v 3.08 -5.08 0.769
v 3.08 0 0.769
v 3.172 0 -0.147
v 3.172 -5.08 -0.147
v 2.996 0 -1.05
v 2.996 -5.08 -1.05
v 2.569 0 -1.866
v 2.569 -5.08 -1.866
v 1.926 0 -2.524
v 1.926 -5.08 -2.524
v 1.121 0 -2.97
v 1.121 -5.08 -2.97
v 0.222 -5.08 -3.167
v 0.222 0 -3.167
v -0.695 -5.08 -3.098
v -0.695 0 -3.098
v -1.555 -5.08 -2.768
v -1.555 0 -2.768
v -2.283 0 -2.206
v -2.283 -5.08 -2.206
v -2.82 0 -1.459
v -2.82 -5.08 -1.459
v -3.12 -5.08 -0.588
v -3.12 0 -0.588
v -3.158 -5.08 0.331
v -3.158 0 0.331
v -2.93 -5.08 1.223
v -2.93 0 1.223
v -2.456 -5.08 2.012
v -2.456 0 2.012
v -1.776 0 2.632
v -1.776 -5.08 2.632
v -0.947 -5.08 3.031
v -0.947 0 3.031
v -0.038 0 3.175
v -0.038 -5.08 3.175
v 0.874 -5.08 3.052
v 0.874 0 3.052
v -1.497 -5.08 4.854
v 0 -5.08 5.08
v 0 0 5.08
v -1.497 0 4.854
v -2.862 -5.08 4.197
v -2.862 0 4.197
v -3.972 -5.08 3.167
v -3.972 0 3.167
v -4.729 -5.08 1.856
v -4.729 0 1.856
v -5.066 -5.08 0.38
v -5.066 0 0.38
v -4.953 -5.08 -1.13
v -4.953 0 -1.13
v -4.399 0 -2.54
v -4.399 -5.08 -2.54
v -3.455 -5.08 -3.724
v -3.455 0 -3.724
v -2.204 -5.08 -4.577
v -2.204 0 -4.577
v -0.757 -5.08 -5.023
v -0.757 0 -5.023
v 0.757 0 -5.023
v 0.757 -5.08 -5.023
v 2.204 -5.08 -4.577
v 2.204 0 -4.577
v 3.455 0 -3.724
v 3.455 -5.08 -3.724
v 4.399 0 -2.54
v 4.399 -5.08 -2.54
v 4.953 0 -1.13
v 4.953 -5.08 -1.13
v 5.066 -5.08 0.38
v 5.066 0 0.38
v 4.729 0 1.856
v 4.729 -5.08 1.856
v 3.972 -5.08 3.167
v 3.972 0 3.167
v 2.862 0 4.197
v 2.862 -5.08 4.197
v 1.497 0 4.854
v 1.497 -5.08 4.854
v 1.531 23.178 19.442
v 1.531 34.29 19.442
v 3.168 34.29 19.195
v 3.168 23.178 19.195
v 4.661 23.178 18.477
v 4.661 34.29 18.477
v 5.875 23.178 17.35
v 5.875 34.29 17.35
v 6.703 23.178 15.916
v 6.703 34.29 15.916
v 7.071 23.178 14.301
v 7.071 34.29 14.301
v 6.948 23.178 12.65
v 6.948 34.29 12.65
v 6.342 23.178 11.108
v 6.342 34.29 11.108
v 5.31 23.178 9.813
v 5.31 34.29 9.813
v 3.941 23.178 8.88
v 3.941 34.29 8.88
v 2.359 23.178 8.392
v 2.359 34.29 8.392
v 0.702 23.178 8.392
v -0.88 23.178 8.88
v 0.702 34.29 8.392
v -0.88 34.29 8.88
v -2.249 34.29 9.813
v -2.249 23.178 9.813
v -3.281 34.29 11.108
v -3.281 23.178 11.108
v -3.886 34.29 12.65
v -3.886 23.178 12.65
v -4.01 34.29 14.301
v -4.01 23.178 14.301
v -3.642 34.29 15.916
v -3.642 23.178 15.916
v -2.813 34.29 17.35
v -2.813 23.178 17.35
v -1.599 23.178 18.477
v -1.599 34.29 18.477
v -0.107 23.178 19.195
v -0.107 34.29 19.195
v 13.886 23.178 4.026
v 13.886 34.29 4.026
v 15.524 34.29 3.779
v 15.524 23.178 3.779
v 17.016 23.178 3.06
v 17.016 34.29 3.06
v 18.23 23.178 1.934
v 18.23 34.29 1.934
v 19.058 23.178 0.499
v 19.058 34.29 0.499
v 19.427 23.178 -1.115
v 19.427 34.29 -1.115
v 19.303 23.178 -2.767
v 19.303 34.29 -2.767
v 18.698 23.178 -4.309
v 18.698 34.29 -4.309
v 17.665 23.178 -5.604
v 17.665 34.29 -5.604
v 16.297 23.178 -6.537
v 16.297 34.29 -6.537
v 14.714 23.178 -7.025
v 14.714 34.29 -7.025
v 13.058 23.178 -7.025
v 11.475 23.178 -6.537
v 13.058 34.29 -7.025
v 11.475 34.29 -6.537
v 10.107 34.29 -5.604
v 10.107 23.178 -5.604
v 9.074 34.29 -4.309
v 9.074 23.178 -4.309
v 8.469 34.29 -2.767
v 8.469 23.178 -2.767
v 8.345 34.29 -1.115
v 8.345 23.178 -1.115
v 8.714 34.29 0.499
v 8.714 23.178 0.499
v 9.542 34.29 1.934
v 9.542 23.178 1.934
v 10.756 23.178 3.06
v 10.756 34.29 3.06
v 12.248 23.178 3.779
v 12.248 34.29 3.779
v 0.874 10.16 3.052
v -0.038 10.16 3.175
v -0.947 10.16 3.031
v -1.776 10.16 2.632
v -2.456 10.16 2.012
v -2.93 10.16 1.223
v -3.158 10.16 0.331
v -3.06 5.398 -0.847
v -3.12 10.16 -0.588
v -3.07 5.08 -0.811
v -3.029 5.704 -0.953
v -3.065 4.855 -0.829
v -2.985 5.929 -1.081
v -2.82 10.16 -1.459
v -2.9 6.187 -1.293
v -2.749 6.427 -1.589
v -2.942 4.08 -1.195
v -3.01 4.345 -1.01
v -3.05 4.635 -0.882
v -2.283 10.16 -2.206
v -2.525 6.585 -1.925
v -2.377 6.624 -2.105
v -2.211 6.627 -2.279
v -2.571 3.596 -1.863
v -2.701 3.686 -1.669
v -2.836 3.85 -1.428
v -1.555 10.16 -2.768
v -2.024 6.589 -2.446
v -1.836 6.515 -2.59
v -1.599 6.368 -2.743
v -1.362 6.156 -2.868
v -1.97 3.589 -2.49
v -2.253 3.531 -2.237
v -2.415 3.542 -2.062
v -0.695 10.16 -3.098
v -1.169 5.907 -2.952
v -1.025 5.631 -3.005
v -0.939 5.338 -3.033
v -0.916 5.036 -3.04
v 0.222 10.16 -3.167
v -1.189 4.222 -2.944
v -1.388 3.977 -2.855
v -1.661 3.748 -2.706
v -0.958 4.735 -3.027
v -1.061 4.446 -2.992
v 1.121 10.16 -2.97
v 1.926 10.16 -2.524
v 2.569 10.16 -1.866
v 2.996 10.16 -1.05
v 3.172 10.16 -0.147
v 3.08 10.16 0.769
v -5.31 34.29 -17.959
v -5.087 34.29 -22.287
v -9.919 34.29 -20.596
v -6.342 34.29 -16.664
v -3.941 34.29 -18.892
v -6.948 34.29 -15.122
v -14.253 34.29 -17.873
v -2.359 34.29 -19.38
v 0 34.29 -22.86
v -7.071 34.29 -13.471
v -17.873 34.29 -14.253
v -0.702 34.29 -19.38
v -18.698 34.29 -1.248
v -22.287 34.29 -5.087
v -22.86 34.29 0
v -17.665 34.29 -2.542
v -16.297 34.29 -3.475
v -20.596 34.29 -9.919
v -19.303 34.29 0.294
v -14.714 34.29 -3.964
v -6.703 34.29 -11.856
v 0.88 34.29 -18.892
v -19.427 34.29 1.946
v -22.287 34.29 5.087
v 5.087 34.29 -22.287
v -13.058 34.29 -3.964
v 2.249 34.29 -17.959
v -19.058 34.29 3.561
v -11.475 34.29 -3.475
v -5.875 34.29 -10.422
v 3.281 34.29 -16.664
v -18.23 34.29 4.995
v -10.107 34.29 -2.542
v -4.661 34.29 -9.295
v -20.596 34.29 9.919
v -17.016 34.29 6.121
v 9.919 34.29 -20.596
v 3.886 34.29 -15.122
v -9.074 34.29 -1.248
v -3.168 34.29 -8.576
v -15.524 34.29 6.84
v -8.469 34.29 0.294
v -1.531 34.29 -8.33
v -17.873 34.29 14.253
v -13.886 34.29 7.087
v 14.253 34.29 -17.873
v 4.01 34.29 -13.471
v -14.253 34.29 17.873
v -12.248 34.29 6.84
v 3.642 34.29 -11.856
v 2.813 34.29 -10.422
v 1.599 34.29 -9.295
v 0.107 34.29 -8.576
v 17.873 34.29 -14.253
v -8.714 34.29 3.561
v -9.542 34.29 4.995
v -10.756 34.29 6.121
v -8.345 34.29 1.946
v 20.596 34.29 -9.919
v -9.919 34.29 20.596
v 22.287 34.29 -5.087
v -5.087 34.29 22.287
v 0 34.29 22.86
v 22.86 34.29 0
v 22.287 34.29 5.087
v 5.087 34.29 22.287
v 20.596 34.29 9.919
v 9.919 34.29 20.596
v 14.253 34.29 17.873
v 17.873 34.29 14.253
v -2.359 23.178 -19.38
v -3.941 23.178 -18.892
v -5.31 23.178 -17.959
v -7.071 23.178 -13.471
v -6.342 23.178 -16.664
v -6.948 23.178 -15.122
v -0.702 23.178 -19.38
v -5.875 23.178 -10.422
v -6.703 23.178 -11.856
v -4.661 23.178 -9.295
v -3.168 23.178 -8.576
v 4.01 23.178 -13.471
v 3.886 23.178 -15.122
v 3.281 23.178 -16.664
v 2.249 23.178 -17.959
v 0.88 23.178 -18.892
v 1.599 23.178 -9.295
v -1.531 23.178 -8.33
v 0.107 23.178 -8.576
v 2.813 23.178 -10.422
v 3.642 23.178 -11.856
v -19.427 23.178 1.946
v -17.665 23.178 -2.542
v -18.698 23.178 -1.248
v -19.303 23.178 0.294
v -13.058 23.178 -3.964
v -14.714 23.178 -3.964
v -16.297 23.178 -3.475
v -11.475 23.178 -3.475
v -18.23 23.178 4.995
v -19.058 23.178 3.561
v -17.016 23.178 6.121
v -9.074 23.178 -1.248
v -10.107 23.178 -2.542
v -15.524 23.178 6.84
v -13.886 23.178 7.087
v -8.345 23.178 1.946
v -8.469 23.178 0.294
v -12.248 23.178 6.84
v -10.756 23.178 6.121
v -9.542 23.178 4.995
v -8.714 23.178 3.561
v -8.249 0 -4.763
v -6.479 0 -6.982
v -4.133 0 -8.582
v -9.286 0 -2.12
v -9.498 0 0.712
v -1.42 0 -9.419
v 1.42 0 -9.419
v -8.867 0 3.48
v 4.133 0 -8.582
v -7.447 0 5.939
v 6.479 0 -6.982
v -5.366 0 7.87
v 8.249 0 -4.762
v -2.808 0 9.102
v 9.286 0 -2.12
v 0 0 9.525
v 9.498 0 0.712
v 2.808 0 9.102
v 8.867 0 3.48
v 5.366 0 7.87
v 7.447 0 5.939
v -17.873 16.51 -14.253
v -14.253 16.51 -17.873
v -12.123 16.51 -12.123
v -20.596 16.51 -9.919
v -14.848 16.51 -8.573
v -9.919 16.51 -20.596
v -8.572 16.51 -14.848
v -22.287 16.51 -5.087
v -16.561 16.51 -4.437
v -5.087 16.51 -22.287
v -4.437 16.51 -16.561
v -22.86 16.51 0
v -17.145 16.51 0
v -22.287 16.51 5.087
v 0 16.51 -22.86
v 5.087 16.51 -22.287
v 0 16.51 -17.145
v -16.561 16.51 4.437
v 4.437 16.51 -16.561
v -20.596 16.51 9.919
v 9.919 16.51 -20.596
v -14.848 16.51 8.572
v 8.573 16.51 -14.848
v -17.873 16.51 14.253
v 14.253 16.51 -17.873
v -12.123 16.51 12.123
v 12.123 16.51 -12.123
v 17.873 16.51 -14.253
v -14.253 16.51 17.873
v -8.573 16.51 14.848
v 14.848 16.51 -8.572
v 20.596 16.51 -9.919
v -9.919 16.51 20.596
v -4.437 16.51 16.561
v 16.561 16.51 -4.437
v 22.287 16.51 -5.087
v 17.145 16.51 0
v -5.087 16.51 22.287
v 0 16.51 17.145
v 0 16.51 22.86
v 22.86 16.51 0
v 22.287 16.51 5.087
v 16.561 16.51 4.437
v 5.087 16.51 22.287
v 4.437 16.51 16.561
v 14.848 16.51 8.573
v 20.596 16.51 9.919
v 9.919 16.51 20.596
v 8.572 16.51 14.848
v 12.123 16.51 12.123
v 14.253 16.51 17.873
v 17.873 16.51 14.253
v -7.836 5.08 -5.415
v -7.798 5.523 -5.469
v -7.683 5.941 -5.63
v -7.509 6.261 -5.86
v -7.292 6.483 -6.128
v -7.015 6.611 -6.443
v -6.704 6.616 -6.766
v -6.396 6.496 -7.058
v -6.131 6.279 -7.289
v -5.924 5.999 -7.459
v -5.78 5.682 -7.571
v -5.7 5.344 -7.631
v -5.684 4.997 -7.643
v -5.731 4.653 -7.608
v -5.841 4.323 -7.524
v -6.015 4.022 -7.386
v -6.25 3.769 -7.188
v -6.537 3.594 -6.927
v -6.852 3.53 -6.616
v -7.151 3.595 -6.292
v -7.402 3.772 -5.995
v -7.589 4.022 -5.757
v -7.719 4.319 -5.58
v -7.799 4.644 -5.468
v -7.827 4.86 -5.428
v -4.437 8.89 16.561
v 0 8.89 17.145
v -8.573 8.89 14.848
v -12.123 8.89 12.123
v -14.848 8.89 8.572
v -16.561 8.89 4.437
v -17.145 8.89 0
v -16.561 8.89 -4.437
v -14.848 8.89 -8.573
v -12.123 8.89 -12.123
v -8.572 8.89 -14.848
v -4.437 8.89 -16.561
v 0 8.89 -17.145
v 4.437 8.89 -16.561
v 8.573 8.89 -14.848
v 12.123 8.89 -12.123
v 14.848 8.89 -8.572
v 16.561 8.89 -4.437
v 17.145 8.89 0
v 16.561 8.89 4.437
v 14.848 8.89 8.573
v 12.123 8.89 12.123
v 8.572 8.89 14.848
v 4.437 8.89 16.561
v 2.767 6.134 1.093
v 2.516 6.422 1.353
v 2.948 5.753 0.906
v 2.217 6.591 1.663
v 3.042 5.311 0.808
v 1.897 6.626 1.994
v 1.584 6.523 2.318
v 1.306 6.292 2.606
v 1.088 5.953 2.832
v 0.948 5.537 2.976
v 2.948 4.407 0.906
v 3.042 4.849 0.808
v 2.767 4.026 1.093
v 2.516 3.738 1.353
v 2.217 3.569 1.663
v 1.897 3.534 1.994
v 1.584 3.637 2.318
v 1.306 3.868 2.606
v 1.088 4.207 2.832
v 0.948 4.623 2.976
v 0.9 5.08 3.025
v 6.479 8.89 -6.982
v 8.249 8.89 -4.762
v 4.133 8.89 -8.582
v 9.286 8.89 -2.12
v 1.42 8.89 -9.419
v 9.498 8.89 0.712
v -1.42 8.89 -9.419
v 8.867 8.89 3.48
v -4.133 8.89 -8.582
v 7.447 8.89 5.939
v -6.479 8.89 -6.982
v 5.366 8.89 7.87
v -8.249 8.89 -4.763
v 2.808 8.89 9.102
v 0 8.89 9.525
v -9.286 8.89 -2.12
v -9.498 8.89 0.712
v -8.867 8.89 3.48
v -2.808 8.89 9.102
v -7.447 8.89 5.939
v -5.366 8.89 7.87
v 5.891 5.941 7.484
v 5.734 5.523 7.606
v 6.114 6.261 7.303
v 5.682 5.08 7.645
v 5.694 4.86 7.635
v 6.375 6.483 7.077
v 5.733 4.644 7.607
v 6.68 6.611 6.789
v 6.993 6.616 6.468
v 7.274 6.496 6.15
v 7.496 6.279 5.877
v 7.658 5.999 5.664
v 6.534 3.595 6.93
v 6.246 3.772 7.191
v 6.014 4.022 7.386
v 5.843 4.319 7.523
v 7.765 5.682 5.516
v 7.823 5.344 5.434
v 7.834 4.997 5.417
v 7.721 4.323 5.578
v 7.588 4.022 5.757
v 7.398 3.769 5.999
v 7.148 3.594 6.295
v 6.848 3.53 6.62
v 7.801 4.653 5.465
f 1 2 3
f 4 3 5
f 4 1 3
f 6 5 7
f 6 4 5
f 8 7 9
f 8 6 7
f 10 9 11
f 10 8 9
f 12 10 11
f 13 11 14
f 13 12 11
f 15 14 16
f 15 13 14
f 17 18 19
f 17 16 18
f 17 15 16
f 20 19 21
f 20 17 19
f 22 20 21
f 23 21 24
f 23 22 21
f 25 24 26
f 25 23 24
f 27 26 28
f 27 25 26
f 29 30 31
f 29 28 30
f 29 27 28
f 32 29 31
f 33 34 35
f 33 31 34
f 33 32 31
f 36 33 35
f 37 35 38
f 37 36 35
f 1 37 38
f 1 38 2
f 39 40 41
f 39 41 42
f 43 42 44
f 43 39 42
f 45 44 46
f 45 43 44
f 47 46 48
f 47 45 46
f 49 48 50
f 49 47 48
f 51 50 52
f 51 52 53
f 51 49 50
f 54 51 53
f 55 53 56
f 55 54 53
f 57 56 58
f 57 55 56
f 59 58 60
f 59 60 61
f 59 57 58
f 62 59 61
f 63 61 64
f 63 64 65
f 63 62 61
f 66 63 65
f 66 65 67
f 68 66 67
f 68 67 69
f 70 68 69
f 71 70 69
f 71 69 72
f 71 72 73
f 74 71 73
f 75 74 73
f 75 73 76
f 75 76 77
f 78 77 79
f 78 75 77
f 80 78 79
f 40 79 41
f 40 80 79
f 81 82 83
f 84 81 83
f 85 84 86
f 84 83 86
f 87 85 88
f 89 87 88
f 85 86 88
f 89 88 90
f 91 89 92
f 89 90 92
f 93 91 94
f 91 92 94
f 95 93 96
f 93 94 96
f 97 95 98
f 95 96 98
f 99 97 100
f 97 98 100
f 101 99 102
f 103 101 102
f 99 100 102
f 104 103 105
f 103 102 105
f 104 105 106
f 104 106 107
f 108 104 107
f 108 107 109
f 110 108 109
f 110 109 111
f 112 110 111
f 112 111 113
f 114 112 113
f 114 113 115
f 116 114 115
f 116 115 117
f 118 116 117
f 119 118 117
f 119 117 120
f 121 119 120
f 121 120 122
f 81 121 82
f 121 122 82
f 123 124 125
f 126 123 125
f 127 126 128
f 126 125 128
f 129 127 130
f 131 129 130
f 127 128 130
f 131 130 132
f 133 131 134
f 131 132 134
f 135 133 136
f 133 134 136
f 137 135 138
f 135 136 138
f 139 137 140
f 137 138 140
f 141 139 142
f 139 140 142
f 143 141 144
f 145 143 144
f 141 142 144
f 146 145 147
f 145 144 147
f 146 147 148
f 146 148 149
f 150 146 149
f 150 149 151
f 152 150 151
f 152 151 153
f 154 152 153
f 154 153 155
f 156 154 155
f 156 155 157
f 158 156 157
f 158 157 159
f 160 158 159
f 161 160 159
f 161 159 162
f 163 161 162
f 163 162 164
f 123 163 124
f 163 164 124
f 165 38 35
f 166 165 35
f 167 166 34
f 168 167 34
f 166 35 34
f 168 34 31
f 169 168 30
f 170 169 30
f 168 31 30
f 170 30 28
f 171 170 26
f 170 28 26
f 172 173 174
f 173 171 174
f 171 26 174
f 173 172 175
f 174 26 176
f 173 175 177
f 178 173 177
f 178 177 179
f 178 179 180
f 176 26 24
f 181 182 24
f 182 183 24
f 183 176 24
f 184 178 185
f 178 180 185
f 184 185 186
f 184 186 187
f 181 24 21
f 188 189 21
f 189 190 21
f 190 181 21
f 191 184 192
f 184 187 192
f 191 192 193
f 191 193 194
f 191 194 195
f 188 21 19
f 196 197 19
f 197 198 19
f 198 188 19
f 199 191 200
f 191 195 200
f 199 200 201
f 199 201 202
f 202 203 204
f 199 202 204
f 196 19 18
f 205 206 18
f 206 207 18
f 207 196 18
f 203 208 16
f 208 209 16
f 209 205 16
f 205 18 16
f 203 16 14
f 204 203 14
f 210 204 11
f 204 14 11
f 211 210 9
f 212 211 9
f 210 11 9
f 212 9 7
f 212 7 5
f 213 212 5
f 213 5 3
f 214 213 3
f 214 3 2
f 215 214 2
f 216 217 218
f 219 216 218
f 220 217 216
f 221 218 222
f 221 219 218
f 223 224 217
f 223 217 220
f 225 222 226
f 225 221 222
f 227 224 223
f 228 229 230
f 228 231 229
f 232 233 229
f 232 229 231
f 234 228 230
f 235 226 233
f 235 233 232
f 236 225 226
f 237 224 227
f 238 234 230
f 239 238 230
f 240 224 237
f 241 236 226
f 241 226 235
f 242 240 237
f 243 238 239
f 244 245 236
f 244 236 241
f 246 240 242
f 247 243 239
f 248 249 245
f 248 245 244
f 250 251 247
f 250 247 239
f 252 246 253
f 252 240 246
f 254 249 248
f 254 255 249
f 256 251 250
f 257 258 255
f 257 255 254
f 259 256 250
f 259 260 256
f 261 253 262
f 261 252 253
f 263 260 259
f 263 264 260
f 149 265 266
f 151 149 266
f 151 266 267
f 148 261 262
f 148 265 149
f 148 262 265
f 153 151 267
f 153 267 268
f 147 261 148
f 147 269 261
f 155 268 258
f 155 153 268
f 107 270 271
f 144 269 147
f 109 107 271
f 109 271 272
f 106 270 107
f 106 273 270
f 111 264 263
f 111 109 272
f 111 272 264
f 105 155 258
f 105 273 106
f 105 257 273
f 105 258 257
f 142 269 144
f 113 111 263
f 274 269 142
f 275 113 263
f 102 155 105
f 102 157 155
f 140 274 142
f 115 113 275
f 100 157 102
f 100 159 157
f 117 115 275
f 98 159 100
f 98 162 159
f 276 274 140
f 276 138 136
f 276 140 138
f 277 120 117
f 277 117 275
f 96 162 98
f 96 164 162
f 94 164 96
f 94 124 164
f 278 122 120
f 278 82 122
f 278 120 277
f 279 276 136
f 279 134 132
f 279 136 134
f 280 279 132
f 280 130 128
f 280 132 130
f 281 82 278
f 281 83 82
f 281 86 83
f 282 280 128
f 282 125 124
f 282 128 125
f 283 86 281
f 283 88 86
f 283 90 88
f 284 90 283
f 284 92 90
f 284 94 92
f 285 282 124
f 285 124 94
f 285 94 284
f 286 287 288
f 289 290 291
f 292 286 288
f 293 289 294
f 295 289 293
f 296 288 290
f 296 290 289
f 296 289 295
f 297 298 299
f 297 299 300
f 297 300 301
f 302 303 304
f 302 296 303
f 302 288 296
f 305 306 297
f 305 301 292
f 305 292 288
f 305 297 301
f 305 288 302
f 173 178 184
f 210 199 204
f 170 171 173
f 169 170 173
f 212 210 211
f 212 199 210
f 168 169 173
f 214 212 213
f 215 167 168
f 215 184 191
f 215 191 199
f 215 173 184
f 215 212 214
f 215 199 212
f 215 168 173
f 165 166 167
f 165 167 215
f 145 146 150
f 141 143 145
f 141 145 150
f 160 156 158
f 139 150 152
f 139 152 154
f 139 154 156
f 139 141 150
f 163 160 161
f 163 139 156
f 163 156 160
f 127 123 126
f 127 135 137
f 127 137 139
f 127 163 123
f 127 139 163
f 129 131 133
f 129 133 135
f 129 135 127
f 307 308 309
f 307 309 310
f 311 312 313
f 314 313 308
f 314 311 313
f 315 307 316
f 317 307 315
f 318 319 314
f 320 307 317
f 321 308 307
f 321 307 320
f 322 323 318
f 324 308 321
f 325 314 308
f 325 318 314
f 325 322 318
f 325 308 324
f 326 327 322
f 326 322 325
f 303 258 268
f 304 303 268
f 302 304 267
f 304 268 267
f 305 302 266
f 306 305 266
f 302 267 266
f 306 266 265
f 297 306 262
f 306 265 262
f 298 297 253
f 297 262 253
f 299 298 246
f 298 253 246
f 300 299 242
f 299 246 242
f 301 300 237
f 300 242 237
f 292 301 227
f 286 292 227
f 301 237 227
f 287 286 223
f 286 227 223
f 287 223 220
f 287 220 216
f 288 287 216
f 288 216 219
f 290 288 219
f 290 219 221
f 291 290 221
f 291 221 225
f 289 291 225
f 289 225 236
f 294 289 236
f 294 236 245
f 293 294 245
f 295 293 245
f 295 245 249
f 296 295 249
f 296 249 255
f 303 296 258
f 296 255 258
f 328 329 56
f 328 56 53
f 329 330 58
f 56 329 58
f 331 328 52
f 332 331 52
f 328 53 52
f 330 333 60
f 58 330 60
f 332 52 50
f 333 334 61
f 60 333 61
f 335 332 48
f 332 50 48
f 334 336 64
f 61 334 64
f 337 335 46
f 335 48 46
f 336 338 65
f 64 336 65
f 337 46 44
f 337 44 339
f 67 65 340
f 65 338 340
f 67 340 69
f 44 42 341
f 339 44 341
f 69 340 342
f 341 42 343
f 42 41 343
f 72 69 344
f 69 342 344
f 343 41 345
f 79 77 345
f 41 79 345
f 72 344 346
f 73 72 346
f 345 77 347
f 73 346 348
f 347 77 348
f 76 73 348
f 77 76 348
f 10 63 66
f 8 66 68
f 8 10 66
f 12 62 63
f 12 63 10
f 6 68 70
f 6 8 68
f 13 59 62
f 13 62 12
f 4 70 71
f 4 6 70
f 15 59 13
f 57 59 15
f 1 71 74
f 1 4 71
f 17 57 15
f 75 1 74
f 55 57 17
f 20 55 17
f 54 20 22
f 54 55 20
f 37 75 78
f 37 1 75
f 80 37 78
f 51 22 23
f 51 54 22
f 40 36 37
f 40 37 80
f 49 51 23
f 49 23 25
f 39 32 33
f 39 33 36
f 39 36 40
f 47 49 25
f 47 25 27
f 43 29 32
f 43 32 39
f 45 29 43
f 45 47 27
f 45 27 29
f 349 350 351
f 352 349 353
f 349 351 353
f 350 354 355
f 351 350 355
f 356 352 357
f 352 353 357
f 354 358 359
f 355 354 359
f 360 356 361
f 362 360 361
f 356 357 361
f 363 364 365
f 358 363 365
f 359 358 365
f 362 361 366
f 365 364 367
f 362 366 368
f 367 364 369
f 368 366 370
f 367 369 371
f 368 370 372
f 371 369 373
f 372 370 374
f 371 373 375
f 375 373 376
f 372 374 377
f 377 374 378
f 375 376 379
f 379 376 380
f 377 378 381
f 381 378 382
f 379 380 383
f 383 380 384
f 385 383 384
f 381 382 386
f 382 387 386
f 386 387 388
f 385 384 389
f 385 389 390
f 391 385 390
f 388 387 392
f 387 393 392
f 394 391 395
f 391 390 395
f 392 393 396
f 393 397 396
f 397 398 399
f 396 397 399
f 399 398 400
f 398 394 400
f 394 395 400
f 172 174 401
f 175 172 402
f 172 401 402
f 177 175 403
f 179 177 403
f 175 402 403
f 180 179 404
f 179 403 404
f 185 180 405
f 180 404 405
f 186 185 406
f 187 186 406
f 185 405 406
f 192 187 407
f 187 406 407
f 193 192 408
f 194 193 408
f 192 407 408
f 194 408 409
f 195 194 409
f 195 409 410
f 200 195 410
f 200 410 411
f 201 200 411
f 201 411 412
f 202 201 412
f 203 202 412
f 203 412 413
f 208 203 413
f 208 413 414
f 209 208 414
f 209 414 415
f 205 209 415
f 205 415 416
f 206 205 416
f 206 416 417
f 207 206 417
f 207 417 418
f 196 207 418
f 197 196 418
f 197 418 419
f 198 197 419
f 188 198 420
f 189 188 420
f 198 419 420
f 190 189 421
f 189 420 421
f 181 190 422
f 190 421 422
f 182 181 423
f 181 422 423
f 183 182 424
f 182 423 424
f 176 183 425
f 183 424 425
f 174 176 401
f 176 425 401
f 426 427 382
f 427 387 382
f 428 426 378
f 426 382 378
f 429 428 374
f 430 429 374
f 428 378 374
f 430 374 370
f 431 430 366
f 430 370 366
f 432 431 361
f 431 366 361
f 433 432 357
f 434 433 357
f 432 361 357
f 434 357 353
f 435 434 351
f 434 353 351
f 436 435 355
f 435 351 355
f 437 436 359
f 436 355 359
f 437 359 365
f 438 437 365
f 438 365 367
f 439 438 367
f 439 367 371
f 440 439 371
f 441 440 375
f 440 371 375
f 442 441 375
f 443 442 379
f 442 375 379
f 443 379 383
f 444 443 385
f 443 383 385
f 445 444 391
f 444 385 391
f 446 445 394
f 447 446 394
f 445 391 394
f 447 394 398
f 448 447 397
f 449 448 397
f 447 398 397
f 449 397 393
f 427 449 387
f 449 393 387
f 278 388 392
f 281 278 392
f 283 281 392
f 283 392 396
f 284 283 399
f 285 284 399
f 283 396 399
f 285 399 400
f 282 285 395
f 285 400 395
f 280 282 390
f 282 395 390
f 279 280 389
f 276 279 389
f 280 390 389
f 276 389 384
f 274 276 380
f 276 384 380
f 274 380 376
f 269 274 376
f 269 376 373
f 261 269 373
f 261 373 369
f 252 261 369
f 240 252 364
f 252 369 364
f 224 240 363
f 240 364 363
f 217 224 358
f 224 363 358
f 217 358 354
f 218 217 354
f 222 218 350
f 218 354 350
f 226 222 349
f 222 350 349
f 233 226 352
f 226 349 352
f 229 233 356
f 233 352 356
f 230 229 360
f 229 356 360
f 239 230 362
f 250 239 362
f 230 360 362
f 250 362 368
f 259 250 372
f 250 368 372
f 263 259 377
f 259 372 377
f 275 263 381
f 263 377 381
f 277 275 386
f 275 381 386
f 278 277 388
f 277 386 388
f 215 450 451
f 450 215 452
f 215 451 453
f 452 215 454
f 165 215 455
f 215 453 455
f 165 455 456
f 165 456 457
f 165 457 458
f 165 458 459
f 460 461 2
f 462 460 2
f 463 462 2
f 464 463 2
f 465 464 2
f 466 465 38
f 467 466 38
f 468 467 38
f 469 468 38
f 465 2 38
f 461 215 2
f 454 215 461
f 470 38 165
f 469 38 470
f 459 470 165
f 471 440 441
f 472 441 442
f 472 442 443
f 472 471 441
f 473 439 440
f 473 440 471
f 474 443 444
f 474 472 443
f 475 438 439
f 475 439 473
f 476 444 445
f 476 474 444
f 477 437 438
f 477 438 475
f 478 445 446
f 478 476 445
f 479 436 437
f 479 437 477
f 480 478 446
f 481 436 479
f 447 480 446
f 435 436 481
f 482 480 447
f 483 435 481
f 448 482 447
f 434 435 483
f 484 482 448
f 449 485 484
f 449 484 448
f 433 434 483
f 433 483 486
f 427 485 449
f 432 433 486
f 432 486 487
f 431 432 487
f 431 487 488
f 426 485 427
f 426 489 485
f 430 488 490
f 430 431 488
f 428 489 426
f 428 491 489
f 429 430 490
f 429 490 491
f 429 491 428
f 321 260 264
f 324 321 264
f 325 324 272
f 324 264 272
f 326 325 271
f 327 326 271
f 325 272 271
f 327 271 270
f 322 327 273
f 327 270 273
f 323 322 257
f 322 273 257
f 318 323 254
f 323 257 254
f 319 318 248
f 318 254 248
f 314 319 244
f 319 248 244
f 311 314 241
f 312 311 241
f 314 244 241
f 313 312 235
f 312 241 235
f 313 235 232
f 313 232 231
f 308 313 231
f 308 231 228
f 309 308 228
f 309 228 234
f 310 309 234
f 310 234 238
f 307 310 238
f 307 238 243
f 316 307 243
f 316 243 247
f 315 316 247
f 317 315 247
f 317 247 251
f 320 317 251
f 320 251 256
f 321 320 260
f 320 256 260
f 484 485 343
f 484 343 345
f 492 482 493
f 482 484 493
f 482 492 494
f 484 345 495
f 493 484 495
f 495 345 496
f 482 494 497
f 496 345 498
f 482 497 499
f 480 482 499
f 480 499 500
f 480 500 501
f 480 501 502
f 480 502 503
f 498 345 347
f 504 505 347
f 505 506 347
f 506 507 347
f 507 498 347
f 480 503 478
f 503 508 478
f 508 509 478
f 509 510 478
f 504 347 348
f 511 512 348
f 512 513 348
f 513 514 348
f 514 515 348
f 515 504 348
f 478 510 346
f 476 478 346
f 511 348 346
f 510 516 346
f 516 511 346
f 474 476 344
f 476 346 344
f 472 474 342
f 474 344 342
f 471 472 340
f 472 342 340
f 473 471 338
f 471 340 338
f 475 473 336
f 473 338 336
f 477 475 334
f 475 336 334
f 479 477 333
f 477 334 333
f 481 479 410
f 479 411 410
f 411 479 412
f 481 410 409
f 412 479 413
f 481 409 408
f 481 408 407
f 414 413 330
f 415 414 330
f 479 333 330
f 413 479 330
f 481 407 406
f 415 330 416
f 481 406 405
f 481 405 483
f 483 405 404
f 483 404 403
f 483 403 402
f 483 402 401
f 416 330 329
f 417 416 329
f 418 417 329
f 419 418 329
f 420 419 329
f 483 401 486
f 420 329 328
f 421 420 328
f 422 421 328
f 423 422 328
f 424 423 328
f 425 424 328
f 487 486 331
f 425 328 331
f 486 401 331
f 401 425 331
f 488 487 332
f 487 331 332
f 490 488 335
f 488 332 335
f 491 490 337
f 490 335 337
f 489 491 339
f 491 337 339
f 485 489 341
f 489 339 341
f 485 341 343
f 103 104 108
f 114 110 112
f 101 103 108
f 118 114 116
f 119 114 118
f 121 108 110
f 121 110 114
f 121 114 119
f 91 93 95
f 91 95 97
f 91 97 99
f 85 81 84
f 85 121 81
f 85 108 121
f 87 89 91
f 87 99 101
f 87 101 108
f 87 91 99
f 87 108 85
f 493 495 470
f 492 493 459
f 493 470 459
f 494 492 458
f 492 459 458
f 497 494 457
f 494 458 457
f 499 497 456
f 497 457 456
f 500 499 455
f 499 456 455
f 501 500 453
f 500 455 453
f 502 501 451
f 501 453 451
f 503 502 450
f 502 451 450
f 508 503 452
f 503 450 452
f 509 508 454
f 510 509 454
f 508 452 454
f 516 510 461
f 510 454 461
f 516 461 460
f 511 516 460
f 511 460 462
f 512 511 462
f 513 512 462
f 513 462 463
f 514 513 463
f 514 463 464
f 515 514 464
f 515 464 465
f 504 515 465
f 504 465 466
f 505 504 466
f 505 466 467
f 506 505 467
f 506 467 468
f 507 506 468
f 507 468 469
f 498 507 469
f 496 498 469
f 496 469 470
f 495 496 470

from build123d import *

# Parameters (mm, degrees)
SKETCH_1_R          = 9.525
EXTRUDE_1_DEPTH     = 16.51
SKETCH_2_R          = 22.86
EXTRUDE_2_DEPTH     = 17.78
CUT_EXTRUDE_1_DEPTH = 10.16
SKETCH_3_R          = 5.55625
CUT_EXTRUDE_2_DEPTH = 11.1125
SKETCH_5_R          = 1.55
CUT_EXTRUDE_3_DEPTH = 32
SKETCH_6_W          = 7.62
SKETCH_6_H          = 7.62
EXTRUDE_START       = 5.08
SKETCH_7_R          = 5.08
EXTRUDE_3_DEPTH     = 5.08


with BuildPart() as part:
    # 草图1 → 凸台-拉伸1 (new body)
    with BuildSketch(Plane(origin=(0, 0, 0), x_dir=(1, 0, 0), z_dir=(0, 1, 0))):
        with Locations(Location((0, 0, 0), (0, 0, 270))):
            Circle(SKETCH_1_R)
    extrude(amount=EXTRUDE_1_DEPTH)

    # 草图2 → 凸台-拉伸2 (add)
    with BuildSketch(Plane(origin=(0, 16.51, 0), x_dir=(1, 0, 0), z_dir=(0, 1, 0))):
        with Locations(Location((0, 0, 0), (0, 0, 270))):
            Circle(SKETCH_2_R)
    extrude(amount=EXTRUDE_2_DEPTH)

    # 草图4 → 切除-拉伸1 (cut)
    with BuildSketch(Plane.XZ):
        with BuildLine():
            Line((3.080497473, 0.768869508), (0.87438821, 3.052223822))
            ThreePointArc((0.87438821, 3.052223822), (-2.283354313, -2.206109263), (3.080497473, 0.768869508))
        make_face()
    extrude(amount=-CUT_EXTRUDE_1_DEPTH, mode=Mode.SUBTRACT)

    # 草图3 → 切除-拉伸2 (cut)
    with BuildSketch(Plane(origin=(0, 34.29, 0), x_dir=(1, 0, 0), z_dir=(0, 1, 0))):
        with Locations(Location((-13.885899292, -1.530588399, 0), (0, 0, 270))):
            Circle(SKETCH_3_R)
        with Locations(Location((-1.530588399, 13.885899292, 0), (0, 0, 270))):
            Circle(SKETCH_3_R)
        with Locations(Location((13.885899292, 1.530588399, 0), (0, 0, 270))):
            Circle(SKETCH_3_R)
        with Locations(Location((1.530588399, -13.885899292, 0), (0, 0, 270))):
            Circle(SKETCH_3_R)
    extrude(amount=-CUT_EXTRUDE_2_DEPTH, mode=Mode.SUBTRACT)

    # 草图5 → 切除-拉伸3 (cut)
    with BuildSketch(Plane(origin=(-7.155974413, 0, -6.913890386), x_dir=(-0.6948375630636291, 0, 0.7191667129086254), z_dir=(-0.7191667129086254, 0, -0.6948375630636291))):
        with Locations((0, 5.08)):
            Circle(SKETCH_5_R)
    extrude(amount=-CUT_EXTRUDE_3_DEPTH, mode=Mode.SUBTRACT)

    # 草图6 → 旋转2 (revolve)
    with BuildSketch(Plane(origin=(0, 0, 0), x_dir=(-0.9998520121667556, 0, 0.01720330683589877), z_dir=(-0.01720330683589877, 0, -0.9998520121667556)), mode=Mode.PRIVATE) as revolve_2_sk:
        with Locations((-13.335, 12.7)):
            Rectangle(SKETCH_6_W, SKETCH_6_H)
    revolve(revolve_2_sk.sketch.rotate(Axis((0, 16.51, 0), (0, -1, 0)), 90.985725501), axis=Axis((0, 16.51, 0), (0, -1, 0)))

    # 草图7 → 凸台-拉伸3 (add)
    with BuildSketch(Plane.XZ.offset(EXTRUDE_START)):
        with Locations(Location((0, 0, 0), (0, 0, 90))):
            Circle(SKETCH_7_R)
        with BuildLine():
            Line((0.87438821, 3.052223822), (3.080497473, 0.768869508))
            ThreePointArc((3.080497473, 0.768869508), (-2.283354313, -2.206109263), (0.87438821, 3.052223822))
        make_face(mode=Mode.SUBTRACT)
    extrude(amount=-EXTRUDE_3_DEPTH)


solid = part.part
